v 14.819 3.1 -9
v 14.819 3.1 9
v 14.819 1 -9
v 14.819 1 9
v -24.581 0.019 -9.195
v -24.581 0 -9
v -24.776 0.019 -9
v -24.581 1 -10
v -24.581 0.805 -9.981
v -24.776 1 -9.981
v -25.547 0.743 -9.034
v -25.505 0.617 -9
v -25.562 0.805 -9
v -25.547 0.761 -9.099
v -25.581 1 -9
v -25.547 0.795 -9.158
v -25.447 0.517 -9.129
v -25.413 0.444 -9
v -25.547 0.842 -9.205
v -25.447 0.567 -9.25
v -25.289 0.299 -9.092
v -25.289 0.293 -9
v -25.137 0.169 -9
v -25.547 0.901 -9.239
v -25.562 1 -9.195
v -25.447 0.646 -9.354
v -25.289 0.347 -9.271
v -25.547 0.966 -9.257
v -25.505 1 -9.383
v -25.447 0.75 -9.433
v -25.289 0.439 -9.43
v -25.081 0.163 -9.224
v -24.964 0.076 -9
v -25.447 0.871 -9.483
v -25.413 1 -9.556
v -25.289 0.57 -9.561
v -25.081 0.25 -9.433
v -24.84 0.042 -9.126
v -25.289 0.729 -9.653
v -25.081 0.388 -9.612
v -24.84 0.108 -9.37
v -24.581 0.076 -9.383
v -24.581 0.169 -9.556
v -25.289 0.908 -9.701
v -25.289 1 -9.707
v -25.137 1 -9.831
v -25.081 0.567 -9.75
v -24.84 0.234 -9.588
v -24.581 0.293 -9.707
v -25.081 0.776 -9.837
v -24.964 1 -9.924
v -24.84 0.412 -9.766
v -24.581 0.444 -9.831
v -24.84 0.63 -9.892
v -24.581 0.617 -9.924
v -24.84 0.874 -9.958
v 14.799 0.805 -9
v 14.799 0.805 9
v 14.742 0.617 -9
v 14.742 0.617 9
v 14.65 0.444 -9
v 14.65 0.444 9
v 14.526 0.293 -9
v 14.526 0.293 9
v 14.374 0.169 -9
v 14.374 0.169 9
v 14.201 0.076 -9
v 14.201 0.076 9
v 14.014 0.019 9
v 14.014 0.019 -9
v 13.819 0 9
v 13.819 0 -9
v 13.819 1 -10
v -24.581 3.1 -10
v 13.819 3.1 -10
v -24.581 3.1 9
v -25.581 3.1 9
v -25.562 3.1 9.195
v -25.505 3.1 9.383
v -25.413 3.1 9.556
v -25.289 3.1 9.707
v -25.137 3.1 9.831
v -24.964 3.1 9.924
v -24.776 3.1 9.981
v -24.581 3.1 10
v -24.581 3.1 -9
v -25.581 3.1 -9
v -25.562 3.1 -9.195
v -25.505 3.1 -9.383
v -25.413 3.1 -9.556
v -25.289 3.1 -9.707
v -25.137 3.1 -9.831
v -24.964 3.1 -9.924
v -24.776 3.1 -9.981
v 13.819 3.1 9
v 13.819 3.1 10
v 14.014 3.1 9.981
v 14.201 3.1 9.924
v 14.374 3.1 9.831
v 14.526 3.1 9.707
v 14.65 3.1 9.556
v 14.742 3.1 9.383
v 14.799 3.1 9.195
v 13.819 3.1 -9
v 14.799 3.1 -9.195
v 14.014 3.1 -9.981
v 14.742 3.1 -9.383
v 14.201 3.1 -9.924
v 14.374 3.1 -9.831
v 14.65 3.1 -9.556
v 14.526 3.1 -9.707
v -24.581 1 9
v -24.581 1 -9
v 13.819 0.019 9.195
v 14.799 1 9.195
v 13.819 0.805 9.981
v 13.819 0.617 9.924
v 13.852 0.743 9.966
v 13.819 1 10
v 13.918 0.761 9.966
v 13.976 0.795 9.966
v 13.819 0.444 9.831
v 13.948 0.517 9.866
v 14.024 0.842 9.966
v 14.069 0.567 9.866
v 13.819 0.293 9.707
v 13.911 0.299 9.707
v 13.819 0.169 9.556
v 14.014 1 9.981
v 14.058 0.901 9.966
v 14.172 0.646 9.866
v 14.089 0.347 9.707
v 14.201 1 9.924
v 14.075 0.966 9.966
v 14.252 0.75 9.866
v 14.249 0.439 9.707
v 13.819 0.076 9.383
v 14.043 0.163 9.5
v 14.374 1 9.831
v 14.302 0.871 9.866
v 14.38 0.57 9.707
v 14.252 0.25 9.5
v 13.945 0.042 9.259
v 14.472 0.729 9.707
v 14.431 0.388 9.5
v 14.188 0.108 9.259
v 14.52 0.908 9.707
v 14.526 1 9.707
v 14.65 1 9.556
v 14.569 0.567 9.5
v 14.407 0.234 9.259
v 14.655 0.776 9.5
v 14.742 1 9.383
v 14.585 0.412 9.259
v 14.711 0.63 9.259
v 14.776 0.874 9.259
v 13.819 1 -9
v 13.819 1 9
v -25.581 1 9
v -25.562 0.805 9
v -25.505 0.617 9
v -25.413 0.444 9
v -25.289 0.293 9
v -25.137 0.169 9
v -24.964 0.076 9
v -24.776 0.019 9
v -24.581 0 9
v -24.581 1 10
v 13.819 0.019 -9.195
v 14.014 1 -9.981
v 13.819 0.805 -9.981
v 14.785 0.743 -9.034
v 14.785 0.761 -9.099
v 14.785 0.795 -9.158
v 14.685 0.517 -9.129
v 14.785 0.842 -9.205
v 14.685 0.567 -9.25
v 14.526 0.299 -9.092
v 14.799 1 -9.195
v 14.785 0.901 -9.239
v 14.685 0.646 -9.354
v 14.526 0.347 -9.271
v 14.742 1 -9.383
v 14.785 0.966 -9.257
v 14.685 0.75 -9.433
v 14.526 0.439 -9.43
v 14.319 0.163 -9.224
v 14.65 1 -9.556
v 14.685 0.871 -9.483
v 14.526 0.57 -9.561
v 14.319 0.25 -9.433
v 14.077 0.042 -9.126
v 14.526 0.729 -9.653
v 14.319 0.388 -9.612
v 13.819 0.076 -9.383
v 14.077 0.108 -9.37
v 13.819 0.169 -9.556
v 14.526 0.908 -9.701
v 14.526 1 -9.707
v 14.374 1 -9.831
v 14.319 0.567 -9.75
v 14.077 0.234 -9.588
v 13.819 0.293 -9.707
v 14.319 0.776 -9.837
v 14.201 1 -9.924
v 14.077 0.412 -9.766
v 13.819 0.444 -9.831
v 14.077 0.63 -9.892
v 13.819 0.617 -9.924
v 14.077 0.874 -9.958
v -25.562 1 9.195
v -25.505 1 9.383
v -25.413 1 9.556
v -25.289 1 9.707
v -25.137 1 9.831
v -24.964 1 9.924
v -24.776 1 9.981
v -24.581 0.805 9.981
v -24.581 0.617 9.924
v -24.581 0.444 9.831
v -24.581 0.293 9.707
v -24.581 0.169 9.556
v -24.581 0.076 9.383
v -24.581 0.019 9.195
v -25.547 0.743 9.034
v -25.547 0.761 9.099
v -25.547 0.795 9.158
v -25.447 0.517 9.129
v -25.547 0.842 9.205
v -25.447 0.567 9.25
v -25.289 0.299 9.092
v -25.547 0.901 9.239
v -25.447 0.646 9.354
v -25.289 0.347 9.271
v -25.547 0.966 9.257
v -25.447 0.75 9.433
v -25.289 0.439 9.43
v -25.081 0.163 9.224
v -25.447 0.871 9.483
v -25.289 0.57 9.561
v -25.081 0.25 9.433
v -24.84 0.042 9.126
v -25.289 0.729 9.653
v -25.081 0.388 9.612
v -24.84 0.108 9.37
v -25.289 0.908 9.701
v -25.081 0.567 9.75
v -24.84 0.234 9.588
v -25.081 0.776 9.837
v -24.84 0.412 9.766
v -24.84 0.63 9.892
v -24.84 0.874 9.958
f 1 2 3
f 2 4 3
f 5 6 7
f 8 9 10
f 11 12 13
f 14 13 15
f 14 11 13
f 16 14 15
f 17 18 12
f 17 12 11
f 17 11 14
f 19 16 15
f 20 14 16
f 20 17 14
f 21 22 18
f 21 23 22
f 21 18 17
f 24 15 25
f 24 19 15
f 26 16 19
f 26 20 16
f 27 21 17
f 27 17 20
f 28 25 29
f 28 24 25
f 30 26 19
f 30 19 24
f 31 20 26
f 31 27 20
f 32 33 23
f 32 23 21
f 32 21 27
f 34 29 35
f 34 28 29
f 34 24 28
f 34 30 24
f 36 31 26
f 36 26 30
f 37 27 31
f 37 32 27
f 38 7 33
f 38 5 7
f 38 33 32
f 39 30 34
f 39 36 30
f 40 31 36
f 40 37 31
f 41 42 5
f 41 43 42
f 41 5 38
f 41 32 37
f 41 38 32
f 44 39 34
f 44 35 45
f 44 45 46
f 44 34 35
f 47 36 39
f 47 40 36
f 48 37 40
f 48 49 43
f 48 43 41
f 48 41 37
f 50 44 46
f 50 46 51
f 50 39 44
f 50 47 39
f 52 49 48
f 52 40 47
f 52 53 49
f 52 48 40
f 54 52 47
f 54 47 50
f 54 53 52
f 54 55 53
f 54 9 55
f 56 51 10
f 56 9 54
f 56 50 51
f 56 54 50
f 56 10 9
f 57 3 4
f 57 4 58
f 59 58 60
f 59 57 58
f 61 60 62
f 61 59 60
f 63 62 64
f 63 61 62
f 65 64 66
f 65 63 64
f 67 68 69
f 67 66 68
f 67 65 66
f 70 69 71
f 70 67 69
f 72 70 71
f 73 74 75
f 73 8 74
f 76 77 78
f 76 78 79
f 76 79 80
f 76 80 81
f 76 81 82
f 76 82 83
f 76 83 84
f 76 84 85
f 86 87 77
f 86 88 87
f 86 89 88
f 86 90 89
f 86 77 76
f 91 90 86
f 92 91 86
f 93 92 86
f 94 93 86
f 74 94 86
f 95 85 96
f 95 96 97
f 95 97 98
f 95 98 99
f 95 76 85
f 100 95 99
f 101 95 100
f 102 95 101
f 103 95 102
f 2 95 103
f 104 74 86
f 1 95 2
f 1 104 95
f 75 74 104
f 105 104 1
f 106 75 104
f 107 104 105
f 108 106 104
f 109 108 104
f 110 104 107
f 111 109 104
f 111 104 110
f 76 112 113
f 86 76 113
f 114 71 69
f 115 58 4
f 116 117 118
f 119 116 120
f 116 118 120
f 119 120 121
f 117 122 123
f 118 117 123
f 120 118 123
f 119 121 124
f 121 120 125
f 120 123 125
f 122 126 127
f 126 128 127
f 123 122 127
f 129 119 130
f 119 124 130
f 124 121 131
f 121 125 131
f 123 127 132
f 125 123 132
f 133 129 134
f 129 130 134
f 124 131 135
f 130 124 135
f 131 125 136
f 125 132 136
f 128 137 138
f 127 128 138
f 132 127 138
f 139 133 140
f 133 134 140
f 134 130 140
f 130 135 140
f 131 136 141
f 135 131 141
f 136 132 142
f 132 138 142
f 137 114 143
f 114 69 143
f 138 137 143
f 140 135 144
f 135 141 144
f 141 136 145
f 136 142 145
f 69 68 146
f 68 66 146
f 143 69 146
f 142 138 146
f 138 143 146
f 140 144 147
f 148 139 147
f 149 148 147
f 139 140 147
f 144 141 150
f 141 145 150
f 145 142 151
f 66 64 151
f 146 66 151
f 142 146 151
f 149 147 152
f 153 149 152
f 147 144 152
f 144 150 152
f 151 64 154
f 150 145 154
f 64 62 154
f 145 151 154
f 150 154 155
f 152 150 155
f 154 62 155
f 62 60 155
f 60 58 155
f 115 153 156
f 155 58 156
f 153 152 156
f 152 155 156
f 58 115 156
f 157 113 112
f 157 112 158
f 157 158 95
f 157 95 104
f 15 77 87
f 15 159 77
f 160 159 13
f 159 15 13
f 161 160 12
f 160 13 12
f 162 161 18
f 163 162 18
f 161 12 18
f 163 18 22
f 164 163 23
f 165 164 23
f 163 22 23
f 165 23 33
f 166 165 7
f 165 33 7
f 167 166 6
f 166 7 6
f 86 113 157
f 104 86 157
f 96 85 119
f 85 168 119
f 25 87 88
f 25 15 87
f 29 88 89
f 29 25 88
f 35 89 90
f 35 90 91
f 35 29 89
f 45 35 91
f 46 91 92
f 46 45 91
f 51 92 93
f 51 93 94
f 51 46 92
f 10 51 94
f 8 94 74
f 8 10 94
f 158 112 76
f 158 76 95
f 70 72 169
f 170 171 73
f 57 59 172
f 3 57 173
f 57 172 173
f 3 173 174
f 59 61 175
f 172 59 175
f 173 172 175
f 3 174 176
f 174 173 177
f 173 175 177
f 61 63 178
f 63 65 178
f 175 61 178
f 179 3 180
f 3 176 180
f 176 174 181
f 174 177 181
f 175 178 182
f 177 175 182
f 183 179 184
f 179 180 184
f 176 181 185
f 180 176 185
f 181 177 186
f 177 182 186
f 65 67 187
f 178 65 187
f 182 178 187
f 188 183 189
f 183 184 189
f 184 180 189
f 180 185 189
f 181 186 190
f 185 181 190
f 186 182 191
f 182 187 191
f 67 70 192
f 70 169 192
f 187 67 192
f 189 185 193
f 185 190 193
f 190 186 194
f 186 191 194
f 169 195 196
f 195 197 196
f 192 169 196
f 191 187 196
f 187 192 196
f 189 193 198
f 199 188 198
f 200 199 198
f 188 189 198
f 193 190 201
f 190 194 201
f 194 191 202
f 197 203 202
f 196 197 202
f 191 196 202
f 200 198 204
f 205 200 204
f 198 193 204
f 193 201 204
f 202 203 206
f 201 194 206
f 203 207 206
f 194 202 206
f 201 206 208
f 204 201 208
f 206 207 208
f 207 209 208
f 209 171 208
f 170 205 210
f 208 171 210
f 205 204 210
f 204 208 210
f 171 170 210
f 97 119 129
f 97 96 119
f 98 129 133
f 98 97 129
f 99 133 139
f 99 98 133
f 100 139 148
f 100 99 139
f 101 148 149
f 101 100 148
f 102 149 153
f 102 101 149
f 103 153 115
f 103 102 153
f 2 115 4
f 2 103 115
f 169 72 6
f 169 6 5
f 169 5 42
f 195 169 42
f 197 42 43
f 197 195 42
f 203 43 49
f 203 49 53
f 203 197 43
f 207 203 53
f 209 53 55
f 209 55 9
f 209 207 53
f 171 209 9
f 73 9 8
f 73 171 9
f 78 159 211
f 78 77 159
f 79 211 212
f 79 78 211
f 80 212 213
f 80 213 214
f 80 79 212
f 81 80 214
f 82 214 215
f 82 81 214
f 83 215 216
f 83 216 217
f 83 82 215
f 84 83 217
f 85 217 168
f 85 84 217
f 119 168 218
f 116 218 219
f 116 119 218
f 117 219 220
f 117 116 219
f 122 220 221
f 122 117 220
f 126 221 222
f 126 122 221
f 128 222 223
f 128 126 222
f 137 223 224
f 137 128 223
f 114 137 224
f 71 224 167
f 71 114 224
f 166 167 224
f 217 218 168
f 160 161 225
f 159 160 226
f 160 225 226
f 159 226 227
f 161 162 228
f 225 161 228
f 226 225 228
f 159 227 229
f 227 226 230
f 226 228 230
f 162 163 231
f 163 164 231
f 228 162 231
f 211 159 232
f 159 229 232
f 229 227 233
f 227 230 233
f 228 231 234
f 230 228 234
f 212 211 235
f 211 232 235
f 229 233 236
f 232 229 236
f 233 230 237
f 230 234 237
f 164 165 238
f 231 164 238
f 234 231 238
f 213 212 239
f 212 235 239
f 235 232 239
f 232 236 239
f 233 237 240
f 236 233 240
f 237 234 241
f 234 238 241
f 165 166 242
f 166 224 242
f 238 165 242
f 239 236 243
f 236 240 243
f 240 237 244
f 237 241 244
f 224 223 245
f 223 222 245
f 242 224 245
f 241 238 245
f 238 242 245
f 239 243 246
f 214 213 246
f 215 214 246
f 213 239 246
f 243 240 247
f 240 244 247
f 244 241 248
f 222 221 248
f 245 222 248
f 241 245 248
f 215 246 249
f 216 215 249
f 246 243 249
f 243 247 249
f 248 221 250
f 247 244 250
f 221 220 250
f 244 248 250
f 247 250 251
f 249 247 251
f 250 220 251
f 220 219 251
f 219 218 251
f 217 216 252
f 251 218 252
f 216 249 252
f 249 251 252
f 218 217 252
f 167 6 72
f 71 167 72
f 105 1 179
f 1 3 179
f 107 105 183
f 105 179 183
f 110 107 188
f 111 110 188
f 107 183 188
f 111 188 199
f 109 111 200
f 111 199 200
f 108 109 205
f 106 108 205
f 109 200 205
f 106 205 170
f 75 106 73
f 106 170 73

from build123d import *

# Parameters (mm, degrees)
ESQUISSE1_W        = 40.4
ESQUISSE1_H        = 20
BOSS_EXTRU_1_DEPTH = 1
ESQUISSE2_W        = 40.4
ESQUISSE2_H        = 20
ESQUISSE2_W_2      = 38.4
ESQUISSE2_H_2      = 18
BOSS_EXTRU_2_DEPTH = 2.1
CONG_1_R           = 1


with BuildPart() as part:
    # Esquisse1 → Boss.-Extru.1 (new body)
    with BuildSketch(Plane(origin=(0, 0, 0), x_dir=(1, 0, 0), z_dir=(0, 1, 0))):
        with Locations((-5.381395349, 0)):
            Rectangle(ESQUISSE1_W, ESQUISSE1_H)
    extrude(amount=BOSS_EXTRU_1_DEPTH)

    # Esquisse2 → Boss.-Extru.2 (add)
    with BuildSketch(Plane(origin=(0, 1, 0), x_dir=(1, 0, 0), z_dir=(0, 1, 0))):
        with Locations((-5.381395349, 0)):
            Rectangle(ESQUISSE2_W, ESQUISSE2_H)
        with Locations((-5.381395349, 0)):
            Rectangle(ESQUISSE2_W_2, ESQUISSE2_H_2, mode=Mode.SUBTRACT)
    extrude(amount=BOSS_EXTRU_2_DEPTH)

    # Congé1
    cong_1_edges = [part.edges().sort_by_distance(p)[0] for p in [
        (-5.381395349, 0, -10),
        (14.818604651, 0, 0),
        (-5.381395349, 0, 10),
        (-25.581395349, 0, 0),
        (-25.581395349, 1.55, -10),
        (14.818604651, 1.55, -10),
        (14.818604651, 1.55, 10),
        (-25.581395349, 1.55, 10),
    ]]
    fillet(cong_1_edges, radius=CONG_1_R)


solid = part.part
